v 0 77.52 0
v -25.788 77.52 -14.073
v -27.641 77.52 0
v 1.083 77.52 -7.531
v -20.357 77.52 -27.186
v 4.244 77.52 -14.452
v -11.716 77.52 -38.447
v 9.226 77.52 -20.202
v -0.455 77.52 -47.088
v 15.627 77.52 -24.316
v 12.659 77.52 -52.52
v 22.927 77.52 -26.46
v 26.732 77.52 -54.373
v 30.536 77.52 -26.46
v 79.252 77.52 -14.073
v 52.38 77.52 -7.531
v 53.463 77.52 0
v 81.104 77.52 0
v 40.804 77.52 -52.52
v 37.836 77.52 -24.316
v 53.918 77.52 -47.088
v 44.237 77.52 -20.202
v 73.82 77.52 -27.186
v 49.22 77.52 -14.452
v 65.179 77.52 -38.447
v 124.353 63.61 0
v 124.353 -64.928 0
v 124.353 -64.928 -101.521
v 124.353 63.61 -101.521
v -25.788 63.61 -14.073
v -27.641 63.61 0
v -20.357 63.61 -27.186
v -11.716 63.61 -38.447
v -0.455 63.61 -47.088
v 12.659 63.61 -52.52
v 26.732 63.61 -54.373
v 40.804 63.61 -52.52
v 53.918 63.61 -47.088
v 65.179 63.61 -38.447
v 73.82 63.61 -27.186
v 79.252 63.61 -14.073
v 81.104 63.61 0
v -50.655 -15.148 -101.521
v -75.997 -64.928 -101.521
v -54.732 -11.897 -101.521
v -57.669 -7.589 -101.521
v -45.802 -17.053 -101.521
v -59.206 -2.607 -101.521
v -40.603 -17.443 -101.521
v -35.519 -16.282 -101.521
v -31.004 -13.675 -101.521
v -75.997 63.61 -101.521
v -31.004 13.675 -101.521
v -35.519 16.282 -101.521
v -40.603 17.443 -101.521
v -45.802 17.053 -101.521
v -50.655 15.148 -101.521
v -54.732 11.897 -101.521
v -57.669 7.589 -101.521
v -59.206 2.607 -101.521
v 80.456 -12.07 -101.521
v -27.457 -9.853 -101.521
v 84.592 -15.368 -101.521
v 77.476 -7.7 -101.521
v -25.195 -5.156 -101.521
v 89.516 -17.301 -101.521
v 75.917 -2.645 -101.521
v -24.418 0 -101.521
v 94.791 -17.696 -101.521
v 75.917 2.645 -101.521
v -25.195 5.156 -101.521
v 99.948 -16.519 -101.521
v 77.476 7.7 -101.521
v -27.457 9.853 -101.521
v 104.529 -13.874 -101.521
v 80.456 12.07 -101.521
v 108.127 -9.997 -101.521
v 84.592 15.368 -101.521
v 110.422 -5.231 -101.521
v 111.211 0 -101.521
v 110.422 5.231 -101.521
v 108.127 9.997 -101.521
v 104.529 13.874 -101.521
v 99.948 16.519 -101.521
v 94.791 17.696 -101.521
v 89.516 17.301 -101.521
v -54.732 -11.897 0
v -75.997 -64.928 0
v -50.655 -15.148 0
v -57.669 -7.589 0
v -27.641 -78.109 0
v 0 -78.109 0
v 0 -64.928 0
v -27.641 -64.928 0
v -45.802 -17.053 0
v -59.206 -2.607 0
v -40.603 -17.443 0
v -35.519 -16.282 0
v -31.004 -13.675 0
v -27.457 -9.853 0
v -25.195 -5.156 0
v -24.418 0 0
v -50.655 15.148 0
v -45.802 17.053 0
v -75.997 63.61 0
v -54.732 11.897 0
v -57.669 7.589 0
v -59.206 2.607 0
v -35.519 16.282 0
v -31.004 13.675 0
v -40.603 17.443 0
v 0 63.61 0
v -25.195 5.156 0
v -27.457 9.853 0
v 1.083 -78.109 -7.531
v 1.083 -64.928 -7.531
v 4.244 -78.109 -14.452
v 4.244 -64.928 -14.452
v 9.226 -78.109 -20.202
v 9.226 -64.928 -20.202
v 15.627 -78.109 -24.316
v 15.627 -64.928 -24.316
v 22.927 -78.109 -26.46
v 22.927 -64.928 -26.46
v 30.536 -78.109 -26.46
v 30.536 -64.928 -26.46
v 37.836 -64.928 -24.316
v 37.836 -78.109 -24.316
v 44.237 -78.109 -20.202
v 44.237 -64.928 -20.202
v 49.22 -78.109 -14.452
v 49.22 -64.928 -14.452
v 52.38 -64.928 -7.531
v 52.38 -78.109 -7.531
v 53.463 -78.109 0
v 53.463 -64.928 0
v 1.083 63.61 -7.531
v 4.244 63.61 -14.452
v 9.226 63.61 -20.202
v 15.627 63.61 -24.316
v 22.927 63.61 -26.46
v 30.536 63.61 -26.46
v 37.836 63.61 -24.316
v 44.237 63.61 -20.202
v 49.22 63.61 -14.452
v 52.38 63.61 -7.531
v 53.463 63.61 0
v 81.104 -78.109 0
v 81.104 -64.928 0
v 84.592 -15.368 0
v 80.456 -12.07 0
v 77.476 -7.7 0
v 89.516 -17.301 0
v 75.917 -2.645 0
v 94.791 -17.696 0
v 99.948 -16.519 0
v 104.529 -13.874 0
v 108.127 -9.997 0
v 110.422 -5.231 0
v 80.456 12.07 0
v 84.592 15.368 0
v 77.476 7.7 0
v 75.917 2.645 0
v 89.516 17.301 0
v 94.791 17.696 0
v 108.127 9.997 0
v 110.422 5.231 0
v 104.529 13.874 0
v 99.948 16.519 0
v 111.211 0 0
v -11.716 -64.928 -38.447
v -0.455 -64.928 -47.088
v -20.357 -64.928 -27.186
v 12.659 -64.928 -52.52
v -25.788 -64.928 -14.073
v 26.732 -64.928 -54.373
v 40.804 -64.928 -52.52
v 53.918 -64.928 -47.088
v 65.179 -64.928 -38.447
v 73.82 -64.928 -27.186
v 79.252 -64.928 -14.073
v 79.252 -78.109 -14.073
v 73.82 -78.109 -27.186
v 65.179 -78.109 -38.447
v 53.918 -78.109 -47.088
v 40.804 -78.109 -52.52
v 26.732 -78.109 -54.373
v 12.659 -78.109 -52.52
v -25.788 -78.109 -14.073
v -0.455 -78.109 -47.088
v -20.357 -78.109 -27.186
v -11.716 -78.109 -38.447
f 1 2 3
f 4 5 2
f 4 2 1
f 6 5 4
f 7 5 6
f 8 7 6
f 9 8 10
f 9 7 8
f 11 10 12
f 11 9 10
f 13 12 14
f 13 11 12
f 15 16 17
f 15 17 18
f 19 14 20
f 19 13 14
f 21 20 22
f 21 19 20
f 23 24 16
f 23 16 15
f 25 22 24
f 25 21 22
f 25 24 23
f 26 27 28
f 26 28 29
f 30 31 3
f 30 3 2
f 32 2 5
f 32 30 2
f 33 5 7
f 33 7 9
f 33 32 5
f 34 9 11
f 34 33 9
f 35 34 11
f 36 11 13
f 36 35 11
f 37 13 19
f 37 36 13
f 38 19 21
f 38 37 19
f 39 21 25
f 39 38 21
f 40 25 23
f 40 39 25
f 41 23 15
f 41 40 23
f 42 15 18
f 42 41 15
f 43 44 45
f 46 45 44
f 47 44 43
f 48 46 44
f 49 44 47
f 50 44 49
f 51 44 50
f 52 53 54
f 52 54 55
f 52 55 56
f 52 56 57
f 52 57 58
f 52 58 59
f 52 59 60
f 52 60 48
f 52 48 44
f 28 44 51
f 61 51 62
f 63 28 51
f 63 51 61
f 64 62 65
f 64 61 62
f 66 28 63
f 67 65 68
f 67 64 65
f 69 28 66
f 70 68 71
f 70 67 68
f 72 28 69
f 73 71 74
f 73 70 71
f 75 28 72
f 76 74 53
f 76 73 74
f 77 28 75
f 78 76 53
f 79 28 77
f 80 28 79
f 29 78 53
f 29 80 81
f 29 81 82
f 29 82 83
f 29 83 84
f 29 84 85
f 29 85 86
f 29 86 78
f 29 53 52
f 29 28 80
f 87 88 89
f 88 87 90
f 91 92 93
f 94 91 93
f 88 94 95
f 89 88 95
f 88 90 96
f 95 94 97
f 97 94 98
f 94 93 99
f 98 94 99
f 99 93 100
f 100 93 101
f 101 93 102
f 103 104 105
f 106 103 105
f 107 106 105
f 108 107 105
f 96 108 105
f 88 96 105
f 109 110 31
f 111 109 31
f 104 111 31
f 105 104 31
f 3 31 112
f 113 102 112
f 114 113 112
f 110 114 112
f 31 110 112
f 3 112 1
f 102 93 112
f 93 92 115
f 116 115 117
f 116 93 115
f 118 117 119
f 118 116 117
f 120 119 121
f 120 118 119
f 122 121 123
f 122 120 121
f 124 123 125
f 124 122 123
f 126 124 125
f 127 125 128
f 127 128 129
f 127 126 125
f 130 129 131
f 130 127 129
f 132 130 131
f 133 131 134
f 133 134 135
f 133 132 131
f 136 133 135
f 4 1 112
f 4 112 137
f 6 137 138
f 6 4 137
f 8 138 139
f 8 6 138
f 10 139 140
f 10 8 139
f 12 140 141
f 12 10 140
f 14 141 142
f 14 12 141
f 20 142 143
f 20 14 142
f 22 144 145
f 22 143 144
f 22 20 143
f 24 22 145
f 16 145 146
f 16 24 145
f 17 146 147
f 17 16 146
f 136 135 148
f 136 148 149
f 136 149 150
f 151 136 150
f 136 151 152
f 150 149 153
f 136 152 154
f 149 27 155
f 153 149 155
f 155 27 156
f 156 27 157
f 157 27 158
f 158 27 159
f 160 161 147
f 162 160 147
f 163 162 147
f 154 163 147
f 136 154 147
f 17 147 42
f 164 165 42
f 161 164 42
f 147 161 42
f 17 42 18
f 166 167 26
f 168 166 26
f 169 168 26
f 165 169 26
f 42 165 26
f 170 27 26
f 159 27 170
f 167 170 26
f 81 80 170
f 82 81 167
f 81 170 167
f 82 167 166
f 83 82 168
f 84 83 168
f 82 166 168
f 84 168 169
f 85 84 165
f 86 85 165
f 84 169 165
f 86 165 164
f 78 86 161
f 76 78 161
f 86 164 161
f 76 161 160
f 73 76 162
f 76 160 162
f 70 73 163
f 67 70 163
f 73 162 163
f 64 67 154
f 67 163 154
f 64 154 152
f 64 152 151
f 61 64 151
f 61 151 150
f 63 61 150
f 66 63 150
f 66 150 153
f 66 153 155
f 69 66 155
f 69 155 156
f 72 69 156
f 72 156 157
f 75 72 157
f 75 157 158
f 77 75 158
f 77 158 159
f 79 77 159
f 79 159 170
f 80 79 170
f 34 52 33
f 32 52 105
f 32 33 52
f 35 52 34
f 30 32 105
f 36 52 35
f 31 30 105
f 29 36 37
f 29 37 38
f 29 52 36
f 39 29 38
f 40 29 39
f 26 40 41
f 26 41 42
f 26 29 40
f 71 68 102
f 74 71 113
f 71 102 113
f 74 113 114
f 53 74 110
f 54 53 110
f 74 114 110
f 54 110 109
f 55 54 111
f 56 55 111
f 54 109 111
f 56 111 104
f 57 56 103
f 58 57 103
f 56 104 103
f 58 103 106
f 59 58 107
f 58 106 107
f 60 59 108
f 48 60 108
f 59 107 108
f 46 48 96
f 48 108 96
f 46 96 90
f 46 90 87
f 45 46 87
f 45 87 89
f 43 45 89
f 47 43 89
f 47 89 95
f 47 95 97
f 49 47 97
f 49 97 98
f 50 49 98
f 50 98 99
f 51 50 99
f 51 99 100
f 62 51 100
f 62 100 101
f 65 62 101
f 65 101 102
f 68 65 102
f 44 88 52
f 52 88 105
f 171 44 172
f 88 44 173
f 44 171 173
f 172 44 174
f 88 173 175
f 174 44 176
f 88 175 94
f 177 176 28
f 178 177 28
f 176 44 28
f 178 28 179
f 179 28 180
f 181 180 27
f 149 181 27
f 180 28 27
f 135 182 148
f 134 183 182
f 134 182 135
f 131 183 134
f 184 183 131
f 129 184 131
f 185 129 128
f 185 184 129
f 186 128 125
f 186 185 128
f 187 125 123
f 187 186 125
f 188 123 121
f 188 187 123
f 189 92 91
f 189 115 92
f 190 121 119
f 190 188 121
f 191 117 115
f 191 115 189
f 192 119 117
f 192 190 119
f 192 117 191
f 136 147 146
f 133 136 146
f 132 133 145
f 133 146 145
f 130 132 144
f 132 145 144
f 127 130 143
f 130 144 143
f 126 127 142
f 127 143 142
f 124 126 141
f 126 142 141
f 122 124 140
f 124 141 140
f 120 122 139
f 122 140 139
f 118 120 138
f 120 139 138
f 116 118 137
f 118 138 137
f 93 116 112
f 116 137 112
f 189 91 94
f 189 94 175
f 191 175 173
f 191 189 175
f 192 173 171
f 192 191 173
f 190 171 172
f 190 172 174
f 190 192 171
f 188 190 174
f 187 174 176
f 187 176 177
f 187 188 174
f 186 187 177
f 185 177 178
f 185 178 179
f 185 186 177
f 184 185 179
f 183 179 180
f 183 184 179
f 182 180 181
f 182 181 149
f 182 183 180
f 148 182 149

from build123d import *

# Parameters (mm, degrees)
F9_W      = 43.2008653879
F9_H      = 75.3829777241
F9_R      = 14.3386602655
F2_DEPTH  = 155.629181994
F3_W      = 128.537401557
F3_H      = 101.5209108591
F4_DEPTH  = 124.3528658524
F5_W      = 48.3558294363
F5_H      = 128.537401557
F11_DEPTH = 101.5219108591
F6_DEPTH  = 141.7193876038
F7_R      = 17.7458538463
F7_R_2    = 17.4915066441
F8_DEPTH  = 101.5219108591


with BuildPart() as f0:
    # F9 (on Top) → F0 (revolve)
    with BuildSketch(Plane.XY):
        Polygon((-27.6412069798, 37.691488862), (-27.6412069798, -37.691488862), (-27.6412069798, -78.1085044146), (0, -78.1085044146), (0, 77.5196775794), (-27.6412069798, 77.5196775794), align=None)
        with Locations((-49.2416396737, 0)):
            Rectangle(F9_W, F9_H)
        with Locations((-49.2416396737, 0)):
            Circle(F9_R, mode=Mode.SUBTRACT)
    revolve(axis=Axis((26.7316251993, -0.5888938904, 0), (0, -1, 0)))

    # F1 (on face) → F2 (cut, through all)
    with BuildSketch(Plane.XZ.offset(78.1085044146)):
        with BuildLine():
            ThreePointArc((0, 0), (26.7316251993, 26.7316251993), (53.4632503986, 0))
            Line((53.4632503986, 0), (81.1044573784, 0))
            ThreePointArc((81.1044573784, 0), (26.7316251993, 54.3728321791), (-27.6412069798, 0))
            Line((-27.6412069798, 0), (0, 0))
        make_face()
        with BuildLine():
            ThreePointArc((-27.6412069798, 0), (26.7316251993, 54.3728321791), (81.1044573784, 0))
            Line((81.1044573784, 0), (155.7151675224, 0))
            Line((155.7151675224, 0), (155.7151675224, 112.1997013688))
            Line((155.7151675224, 112.1997013688), (-91.2333577871, 112.1997013688))
            Line((-91.2333577871, 112.1997013688), (-91.2333577871, 0))
            Line((-91.2333577871, 0), (-27.6412069798, 0))
        make_face()
    extrude(amount=-F2_DEPTH, mode=Mode.SUBTRACT)

    # F3 (on Right) → F4 (join, symmetric)
    with BuildSketch(Plane.YZ):
        with Locations((-0.6588175893, -50.7604554296)):
            Rectangle(F3_W, F3_H)
    extrude(amount=F4_DEPTH, both=True)

    # F5 (on face) → F11 (cut, through all)
    with BuildSketch(Plane.XY):
        with Locations((-100.1749511342, -0.6588175893)):
            Rectangle(F5_W, F5_H)
    extrude(amount=-F11_DEPTH, mode=Mode.SUBTRACT)

    # F6 (cut, through all): a face of the model
    f6_faces = [f0.faces().sort_by_distance(p)[0] for p in [
        (26.7316251993, 63.6098831892, -11.3452540996),
    ]]
    extrude(f6_faces, amount=-F6_DEPTH, mode=Mode.SUBTRACT)

    # F7 (on face) → F8 (cut, through all)
    with BuildSketch(Plane.XY):
        with Locations((93.4647321701, 0)):
            Circle(F7_R)
        with Locations((-41.9096574187, 0)):
            Circle(F7_R_2)
    extrude(amount=-F8_DEPTH, mode=Mode.SUBTRACT)


solid = f0.part
